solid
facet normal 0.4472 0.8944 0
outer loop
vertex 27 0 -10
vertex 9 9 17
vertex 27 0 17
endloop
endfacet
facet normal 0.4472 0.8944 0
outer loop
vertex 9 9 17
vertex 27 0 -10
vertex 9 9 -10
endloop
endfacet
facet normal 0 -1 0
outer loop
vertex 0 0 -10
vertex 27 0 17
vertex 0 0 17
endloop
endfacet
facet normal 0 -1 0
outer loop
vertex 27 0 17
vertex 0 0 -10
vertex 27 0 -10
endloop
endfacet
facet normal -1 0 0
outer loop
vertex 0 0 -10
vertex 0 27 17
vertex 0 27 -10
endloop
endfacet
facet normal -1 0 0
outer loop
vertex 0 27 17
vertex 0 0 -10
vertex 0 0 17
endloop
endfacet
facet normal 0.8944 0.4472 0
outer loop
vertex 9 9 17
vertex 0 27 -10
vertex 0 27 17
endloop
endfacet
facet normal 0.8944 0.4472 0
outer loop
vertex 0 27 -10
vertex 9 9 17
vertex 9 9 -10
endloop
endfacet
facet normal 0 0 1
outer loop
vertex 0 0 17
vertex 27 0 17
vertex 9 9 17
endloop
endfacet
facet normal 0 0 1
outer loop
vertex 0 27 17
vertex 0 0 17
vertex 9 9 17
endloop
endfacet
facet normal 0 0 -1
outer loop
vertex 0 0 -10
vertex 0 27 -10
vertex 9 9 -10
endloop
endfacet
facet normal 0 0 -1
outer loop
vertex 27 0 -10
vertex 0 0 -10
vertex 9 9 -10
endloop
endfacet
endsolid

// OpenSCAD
translate([0,0,-10]) scale(3) {
    polyhedron(
        points=[
            [3,3,9],
            [0,9,9],
            [9,0,9],
            [0,0,9],
            [3,3,0],
            [0,9,0],
            [9,0,0],
            [0,0,0],
        ],
        faces=[
            [ 0, 4, 6, 2 ],
            [ 2, 6, 7, 3 ],
            [ 3, 7, 5, 1 ],
            [ 1, 5, 4, 0 ],
            [ 0, 2, 3 ],
            [ 0, 3, 1 ],
            //[ 0, 2, 3, 1 ],
            [ 4, 5, 7 ],
            [ 4, 7, 6 ],
            //[ 4, 5, 7, 6 ],
        ]);
}
